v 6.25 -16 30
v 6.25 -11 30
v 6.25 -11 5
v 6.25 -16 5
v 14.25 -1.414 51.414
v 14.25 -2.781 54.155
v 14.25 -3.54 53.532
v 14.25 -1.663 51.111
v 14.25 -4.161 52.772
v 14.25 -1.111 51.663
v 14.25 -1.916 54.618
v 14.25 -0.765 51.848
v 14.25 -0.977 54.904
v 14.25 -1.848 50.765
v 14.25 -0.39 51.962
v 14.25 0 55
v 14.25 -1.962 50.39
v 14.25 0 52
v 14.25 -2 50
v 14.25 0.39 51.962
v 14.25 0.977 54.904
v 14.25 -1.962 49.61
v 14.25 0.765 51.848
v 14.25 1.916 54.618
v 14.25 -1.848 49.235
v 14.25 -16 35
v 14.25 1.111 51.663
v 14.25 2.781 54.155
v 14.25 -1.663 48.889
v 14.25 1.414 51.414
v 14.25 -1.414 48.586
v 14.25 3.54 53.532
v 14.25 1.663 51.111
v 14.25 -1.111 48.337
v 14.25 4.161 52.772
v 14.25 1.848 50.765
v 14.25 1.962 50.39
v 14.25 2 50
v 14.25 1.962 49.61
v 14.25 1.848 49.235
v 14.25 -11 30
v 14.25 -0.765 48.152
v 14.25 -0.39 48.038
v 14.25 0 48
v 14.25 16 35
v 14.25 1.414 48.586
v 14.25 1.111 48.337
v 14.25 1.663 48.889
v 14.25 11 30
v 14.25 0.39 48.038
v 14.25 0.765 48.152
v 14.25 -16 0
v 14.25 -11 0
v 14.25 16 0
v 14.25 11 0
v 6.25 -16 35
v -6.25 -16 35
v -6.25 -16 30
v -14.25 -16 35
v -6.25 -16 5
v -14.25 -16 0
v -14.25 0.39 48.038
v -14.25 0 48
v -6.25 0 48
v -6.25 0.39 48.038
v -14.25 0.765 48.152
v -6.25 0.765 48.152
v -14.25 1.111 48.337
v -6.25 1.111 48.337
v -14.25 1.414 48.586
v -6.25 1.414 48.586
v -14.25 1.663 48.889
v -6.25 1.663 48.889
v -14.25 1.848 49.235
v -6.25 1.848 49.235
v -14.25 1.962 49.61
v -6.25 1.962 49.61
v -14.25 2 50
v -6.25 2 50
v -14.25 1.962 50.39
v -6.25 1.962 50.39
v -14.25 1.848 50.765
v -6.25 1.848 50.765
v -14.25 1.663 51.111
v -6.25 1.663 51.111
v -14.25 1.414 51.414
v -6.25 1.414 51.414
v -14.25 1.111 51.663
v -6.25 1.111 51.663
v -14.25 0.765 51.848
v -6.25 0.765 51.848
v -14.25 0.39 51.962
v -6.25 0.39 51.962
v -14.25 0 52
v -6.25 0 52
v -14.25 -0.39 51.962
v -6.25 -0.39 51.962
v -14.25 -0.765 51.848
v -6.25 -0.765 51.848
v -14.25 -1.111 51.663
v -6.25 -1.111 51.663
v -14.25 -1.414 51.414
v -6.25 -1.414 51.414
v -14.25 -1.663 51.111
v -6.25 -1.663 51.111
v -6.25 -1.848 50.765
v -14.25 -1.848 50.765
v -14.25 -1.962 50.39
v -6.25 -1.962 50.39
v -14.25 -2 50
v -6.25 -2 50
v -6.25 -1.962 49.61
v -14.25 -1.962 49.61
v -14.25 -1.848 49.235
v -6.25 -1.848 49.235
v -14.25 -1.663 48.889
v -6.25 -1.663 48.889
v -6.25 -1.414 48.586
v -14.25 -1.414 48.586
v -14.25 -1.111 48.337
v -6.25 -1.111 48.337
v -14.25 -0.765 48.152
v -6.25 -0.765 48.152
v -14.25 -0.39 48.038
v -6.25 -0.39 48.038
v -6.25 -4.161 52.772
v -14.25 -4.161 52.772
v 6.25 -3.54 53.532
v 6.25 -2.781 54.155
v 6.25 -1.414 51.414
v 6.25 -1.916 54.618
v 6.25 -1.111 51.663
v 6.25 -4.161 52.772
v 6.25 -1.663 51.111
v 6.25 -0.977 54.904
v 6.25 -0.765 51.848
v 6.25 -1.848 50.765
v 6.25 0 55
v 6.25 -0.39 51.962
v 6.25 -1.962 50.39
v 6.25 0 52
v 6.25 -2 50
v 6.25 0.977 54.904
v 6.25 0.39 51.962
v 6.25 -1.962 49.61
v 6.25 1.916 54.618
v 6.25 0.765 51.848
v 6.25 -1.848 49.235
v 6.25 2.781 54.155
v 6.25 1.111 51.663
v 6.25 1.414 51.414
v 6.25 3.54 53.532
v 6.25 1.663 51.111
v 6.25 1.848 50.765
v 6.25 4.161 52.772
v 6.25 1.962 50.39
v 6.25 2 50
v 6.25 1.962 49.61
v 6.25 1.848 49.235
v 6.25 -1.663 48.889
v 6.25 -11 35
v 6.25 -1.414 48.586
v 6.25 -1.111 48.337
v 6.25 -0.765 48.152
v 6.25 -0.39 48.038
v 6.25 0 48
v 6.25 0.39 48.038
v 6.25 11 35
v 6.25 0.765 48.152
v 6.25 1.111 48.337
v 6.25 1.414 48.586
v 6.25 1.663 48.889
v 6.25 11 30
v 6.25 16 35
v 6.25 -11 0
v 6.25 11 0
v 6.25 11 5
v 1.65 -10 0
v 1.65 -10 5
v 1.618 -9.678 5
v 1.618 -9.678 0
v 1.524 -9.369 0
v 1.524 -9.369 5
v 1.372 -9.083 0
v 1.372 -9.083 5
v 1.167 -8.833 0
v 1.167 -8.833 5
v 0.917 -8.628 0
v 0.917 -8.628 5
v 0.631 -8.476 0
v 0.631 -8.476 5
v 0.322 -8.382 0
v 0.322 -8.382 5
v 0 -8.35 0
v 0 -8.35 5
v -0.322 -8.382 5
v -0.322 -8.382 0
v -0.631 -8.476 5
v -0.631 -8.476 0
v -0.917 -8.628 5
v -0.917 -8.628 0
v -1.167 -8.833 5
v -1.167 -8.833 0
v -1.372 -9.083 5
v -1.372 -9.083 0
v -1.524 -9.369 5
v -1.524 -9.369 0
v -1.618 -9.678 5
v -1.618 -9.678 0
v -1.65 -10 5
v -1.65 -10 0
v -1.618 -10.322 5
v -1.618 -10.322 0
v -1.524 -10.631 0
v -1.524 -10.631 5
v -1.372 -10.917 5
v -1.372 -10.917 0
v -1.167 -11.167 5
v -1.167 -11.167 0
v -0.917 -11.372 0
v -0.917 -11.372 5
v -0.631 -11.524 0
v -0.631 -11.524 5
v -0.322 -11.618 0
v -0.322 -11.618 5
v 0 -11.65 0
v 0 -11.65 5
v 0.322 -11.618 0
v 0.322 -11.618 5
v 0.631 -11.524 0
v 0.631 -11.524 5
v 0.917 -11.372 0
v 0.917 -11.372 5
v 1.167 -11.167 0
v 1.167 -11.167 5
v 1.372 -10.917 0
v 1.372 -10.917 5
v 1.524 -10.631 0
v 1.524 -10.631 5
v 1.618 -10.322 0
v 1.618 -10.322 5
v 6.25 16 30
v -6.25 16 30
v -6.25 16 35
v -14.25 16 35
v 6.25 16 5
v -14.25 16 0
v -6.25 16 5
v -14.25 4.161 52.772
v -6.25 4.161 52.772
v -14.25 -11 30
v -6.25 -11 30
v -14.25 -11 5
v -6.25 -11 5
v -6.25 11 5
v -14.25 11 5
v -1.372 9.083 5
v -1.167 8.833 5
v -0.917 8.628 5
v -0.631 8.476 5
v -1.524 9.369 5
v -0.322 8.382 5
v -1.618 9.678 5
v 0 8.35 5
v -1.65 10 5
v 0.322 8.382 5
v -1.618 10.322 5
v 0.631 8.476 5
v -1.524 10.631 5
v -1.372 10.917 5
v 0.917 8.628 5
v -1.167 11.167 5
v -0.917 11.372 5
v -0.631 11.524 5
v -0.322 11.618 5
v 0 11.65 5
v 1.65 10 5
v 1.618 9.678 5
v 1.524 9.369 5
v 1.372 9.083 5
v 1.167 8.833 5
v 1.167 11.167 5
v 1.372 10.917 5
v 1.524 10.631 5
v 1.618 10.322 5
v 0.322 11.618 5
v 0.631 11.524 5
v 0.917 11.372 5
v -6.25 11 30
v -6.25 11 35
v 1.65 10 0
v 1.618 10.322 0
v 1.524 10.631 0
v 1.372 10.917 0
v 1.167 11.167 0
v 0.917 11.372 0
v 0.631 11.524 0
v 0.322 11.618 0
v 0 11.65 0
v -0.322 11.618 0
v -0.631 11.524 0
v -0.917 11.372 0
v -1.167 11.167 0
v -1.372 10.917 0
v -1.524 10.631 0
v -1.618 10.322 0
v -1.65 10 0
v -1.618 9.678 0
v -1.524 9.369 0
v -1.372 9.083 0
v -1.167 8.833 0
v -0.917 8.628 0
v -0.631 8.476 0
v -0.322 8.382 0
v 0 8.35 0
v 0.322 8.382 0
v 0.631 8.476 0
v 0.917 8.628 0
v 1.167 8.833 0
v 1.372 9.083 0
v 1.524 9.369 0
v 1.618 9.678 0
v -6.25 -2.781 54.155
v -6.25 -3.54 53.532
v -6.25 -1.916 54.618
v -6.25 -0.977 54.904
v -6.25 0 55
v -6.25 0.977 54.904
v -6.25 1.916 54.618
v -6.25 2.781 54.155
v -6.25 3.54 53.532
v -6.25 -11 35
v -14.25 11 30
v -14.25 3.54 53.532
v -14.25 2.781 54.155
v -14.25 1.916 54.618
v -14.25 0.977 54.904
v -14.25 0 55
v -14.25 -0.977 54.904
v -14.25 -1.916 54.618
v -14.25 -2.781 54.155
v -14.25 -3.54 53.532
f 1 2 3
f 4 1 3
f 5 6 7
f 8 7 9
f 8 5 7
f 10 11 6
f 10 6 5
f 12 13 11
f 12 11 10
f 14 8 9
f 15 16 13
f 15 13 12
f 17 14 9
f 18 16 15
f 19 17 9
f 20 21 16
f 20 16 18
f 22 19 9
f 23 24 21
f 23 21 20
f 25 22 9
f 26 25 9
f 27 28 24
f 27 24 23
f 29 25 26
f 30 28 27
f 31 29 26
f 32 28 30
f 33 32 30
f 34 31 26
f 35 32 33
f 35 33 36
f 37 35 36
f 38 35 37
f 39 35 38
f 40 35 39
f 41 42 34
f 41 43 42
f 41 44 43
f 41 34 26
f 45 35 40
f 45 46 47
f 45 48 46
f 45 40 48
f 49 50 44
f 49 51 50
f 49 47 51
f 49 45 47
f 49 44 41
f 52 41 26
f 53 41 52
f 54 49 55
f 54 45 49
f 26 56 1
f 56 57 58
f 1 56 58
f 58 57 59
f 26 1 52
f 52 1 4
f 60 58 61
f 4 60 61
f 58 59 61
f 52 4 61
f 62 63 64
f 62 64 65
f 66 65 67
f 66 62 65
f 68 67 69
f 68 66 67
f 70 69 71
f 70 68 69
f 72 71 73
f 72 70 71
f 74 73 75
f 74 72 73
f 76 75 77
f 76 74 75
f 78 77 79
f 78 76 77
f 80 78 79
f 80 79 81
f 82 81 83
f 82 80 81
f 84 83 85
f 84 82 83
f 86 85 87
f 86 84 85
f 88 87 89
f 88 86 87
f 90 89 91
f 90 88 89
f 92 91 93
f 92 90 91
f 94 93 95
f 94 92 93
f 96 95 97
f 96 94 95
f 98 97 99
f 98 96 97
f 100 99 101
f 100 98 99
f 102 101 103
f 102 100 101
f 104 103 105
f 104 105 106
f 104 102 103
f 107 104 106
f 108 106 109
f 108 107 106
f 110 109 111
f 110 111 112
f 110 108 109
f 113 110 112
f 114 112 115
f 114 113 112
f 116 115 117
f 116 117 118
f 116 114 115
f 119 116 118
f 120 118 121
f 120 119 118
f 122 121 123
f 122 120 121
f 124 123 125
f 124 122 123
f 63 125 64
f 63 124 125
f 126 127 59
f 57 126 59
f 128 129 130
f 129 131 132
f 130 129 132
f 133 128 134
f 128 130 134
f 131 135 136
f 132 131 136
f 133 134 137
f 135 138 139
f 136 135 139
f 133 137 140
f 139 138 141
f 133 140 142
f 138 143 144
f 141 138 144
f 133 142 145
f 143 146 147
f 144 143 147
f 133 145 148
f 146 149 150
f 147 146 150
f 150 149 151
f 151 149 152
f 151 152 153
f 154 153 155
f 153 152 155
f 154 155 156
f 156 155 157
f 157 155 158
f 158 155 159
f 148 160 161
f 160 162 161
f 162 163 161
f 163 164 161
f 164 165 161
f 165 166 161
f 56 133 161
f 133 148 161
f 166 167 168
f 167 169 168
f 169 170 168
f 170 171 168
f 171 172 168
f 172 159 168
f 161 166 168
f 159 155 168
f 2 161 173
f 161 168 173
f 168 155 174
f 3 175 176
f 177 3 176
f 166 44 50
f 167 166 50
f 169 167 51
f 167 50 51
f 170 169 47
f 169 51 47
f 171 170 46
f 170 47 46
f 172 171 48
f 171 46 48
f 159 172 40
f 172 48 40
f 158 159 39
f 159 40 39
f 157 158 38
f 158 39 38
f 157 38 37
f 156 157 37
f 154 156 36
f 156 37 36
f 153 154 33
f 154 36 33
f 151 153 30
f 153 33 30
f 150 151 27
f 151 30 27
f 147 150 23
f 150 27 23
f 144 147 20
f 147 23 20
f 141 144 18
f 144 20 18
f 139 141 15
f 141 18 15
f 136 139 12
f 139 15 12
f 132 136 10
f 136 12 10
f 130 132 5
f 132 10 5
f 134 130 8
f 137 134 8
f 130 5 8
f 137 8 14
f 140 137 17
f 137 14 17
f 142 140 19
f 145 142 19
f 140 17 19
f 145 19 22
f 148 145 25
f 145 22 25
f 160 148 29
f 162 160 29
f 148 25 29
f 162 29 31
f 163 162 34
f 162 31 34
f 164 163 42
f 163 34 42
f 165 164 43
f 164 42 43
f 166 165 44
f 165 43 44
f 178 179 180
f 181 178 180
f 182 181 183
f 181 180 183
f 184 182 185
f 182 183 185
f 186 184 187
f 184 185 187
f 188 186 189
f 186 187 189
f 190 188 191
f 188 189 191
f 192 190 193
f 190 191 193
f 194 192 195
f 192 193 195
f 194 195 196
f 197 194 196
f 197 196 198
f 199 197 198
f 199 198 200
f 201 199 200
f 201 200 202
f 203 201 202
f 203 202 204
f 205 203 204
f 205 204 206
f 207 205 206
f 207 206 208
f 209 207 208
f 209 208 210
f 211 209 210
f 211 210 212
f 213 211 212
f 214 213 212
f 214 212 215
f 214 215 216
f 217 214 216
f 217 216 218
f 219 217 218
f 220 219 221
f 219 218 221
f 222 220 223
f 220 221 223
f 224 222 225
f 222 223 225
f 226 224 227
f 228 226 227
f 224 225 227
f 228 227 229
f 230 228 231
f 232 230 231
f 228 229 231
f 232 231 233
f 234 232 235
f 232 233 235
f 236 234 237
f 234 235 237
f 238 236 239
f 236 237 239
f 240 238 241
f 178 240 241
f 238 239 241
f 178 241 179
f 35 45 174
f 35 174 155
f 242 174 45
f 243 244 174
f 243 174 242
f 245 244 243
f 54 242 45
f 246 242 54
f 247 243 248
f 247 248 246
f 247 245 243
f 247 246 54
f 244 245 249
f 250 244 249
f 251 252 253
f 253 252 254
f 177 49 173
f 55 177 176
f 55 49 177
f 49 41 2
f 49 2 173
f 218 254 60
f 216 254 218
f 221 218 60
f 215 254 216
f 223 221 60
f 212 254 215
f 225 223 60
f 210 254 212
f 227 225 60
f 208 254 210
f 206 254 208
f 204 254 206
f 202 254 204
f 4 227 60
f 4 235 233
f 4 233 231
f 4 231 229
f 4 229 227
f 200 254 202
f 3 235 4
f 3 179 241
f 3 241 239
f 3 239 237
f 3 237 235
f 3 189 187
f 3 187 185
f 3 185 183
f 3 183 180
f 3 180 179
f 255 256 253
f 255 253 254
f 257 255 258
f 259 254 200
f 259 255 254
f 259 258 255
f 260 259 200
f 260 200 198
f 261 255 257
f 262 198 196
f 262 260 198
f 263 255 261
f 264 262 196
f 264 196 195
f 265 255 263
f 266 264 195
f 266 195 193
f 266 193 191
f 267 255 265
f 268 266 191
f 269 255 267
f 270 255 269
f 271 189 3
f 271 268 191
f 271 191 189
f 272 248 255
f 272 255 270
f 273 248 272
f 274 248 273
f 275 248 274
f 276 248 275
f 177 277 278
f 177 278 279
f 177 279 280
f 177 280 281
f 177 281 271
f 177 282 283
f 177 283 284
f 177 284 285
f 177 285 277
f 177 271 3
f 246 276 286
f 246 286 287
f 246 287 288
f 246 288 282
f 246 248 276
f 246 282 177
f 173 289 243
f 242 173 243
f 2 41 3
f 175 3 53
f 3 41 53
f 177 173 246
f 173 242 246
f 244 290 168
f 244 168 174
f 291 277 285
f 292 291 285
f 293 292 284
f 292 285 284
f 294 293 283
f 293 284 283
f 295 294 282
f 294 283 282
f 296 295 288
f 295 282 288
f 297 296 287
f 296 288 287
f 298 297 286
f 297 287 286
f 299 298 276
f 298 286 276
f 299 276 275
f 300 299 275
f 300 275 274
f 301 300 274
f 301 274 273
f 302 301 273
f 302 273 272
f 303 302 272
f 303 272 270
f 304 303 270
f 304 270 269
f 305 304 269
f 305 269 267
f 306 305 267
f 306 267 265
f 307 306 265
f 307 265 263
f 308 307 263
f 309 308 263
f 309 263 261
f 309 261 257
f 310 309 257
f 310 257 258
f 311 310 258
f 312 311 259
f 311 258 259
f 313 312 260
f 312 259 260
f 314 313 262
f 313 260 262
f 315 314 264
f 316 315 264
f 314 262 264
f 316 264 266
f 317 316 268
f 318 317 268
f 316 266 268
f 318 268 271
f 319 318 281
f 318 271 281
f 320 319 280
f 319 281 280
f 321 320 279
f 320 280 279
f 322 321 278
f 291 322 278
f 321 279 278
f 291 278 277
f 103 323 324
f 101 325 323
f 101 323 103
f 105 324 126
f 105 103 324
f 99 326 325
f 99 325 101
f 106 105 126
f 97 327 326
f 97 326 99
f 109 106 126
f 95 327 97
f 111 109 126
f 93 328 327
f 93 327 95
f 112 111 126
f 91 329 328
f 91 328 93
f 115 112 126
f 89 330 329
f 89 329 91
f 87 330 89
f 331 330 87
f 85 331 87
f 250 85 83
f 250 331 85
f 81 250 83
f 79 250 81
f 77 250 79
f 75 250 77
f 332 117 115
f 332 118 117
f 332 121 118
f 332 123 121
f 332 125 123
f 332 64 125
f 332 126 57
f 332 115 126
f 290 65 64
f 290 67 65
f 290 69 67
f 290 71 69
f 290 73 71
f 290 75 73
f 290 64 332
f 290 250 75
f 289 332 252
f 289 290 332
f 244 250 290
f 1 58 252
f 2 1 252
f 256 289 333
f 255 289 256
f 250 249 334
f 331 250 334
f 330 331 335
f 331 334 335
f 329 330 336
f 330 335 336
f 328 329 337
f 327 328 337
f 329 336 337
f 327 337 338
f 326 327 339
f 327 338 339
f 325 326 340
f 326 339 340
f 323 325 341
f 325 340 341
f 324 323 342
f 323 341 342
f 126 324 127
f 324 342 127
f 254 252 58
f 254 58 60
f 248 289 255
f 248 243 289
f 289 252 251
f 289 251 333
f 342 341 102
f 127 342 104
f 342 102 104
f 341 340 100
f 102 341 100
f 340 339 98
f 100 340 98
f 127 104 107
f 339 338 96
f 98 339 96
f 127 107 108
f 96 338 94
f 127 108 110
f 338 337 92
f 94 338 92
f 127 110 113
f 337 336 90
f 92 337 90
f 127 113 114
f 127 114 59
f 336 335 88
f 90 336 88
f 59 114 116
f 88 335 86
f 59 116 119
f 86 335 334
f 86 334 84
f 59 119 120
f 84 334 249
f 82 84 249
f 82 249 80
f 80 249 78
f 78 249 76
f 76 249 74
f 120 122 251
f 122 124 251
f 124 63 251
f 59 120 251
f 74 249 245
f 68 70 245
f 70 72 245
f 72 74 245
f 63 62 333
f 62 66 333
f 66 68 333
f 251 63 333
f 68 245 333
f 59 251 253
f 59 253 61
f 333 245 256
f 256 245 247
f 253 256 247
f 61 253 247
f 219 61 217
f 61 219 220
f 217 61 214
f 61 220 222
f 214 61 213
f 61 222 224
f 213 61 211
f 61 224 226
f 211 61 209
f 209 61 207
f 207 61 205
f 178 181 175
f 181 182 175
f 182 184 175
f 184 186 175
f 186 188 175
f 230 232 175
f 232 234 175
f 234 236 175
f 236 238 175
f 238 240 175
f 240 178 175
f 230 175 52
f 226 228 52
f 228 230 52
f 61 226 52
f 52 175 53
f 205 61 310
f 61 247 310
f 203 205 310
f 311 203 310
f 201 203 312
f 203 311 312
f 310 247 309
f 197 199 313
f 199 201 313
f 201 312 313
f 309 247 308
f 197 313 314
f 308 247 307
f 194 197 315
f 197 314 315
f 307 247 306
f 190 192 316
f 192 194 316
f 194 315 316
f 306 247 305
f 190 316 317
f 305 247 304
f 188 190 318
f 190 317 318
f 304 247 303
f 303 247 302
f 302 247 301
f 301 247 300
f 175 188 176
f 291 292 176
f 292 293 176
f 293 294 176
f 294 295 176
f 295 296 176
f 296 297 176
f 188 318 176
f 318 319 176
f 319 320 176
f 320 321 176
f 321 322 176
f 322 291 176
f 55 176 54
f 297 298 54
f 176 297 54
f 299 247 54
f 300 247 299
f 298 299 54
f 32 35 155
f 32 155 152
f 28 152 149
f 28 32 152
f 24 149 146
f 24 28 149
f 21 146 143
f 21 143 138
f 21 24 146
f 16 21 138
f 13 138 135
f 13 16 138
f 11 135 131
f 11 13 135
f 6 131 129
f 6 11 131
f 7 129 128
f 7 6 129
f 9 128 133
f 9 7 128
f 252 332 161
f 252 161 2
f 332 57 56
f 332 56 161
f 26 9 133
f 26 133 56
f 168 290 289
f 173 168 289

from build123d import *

# Parameters (mm, degrees)
SKETCH_1_W          = 28.5
SKETCH_1_H          = 32
EXTRUDE_1_DEPTH     = 5
SKETCH_3_R          = 2
EXTRUDE_2_DEPTH     = 8
SKETCH_4_R          = 1.65
CUT_EXTRUDE_1_DEPTH = 6
SKETCH_5_R          = 1.65
CUT_EXTRUDE_2_DEPTH = 5
SKETCH_6_W          = 25
SKETCH_6_H          = 22
CUT_EXTRUDE_3_DEPTH = 29.5
EXTRUDE_3_REACH     = 22.5
SKETCH_7_W          = 5
SKETCH_7_H          = 5
SKETCH_8_W          = 8
SKETCH_8_H          = 22
CUT_EXTRUDE_4_DEPTH = 10


with BuildPart() as part:
    # ｽｹｯﾁ1 → ﾎﾞｽ - 押し出し1 (new body)
    with BuildSketch(Plane.XY):
        Rectangle(SKETCH_1_W, SKETCH_1_H)
    extrude(amount=EXTRUDE_1_DEPTH)

    # ｽｹｯﾁ3 → ﾎﾞｽ - 押し出し2 (add)
    with BuildSketch(Plane(origin=(14.25, 0, 0), x_dir=(0, 0, -1), z_dir=(1, 0, 0))):
        with BuildLine():
            Line((-5, 16), (-35, 16))
            Line((-35, 16), (-52.772001082, 4.161251014))
            ThreePointArc((-52.772001082, 4.161251014), (-55, 0), (-52.772001082, -4.161251014))
            Line((-52.772001082, -4.161251014), (-35, -16))
            Line((-35, -16), (-5, -16))
            Line((-5, -16), (-5, 16))
        make_face()
        with Locations((-50, 0)):
            Circle(SKETCH_3_R, mode=Mode.SUBTRACT)
    extrude_2 = extrude(amount=-EXTRUDE_2_DEPTH)

    # ﾐﾗｰ1: ﾎﾞｽ - 押し出し2 across plane
    add(extrude_2.mirror(Plane(origin=(0, 0, 0), x_dir=(0, 0, 1), z_dir=(1, 0, 0))))

    # ｽｹｯﾁ4 → ｶｯﾄ - 押し出し1 (cut, through all)
    with BuildSketch(Plane.XY.offset(5)):
        with Locations((0, 10)):
            Circle(SKETCH_4_R)
        with Locations((0, -10)):
            Circle(SKETCH_4_R)
    extrude(amount=-CUT_EXTRUDE_1_DEPTH, mode=Mode.SUBTRACT)

    # ｽｹｯﾁ5 → ｶｯﾄ - 押し出し2 (cut)
    with BuildSketch(Plane.XY):
        with Locations((12.35, -5)):
            Circle(SKETCH_5_R)
        with Locations((12.35, 5)):
            Circle(SKETCH_5_R)
    extrude(amount=CUT_EXTRUDE_2_DEPTH, mode=Mode.SUBTRACT)

    # ｽｹｯﾁ6 → ｶｯﾄ - 押し出し3 (cut, through all)
    with BuildSketch(Plane(origin=(14.25, 0, 0), x_dir=(0, 0, -1), z_dir=(1, 0, 0))):
        with Locations((-17.5, 0)):
            Rectangle(SKETCH_6_W, SKETCH_6_H)
    extrude(amount=-CUT_EXTRUDE_3_DEPTH, mode=Mode.SUBTRACT)

    # ｽｹｯﾁ7 → ﾎﾞｽ - 押し出し3 (add, up to next)
    with BuildSketch(Plane(origin=(-6.25, 0, 0), x_dir=(0, 0, -1), z_dir=(1, 0, 0)), mode=Mode.PRIVATE) as extrude_3_sk1:
        with Locations((-32.5, 13.5)):
            Rectangle(SKETCH_7_W, SKETCH_7_H)
    extrude_3_tool1 = extrude(extrude_3_sk1.sketch, amount=EXTRUDE_3_REACH, mode=Mode.PRIVATE) - part.part
    add(extrude_3_tool1.solids().sort_by_distance((-6.25, 13.5, 32.5))[0])
    # ｽｹｯﾁ7 → ﾎﾞｽ - 押し出し3 (add, up to next)
    with BuildSketch(Plane(origin=(-6.25, 0, 0), x_dir=(0, 0, -1), z_dir=(1, 0, 0)), mode=Mode.PRIVATE) as extrude_3_sk2:
        with Locations((-32.5, -13.5)):
            Rectangle(SKETCH_7_W, SKETCH_7_H)
    extrude_3_tool2 = extrude(extrude_3_sk2.sketch, amount=EXTRUDE_3_REACH, mode=Mode.PRIVATE) - part.part
    add(extrude_3_tool2.solids().sort_by_distance((-6.25, -13.5, 32.5))[0])

    # ｽｹｯﾁ8 → ｶｯﾄ - 押し出し4 (cut)
    with BuildSketch(Plane(origin=(0, 0, 0), x_dir=(-1, 0, 0), z_dir=(0, 0, -1))):
        with Locations((-10.25, 0)):
            Rectangle(SKETCH_8_W, SKETCH_8_H)
    extrude(amount=-CUT_EXTRUDE_4_DEPTH, mode=Mode.SUBTRACT)


solid = part.part
